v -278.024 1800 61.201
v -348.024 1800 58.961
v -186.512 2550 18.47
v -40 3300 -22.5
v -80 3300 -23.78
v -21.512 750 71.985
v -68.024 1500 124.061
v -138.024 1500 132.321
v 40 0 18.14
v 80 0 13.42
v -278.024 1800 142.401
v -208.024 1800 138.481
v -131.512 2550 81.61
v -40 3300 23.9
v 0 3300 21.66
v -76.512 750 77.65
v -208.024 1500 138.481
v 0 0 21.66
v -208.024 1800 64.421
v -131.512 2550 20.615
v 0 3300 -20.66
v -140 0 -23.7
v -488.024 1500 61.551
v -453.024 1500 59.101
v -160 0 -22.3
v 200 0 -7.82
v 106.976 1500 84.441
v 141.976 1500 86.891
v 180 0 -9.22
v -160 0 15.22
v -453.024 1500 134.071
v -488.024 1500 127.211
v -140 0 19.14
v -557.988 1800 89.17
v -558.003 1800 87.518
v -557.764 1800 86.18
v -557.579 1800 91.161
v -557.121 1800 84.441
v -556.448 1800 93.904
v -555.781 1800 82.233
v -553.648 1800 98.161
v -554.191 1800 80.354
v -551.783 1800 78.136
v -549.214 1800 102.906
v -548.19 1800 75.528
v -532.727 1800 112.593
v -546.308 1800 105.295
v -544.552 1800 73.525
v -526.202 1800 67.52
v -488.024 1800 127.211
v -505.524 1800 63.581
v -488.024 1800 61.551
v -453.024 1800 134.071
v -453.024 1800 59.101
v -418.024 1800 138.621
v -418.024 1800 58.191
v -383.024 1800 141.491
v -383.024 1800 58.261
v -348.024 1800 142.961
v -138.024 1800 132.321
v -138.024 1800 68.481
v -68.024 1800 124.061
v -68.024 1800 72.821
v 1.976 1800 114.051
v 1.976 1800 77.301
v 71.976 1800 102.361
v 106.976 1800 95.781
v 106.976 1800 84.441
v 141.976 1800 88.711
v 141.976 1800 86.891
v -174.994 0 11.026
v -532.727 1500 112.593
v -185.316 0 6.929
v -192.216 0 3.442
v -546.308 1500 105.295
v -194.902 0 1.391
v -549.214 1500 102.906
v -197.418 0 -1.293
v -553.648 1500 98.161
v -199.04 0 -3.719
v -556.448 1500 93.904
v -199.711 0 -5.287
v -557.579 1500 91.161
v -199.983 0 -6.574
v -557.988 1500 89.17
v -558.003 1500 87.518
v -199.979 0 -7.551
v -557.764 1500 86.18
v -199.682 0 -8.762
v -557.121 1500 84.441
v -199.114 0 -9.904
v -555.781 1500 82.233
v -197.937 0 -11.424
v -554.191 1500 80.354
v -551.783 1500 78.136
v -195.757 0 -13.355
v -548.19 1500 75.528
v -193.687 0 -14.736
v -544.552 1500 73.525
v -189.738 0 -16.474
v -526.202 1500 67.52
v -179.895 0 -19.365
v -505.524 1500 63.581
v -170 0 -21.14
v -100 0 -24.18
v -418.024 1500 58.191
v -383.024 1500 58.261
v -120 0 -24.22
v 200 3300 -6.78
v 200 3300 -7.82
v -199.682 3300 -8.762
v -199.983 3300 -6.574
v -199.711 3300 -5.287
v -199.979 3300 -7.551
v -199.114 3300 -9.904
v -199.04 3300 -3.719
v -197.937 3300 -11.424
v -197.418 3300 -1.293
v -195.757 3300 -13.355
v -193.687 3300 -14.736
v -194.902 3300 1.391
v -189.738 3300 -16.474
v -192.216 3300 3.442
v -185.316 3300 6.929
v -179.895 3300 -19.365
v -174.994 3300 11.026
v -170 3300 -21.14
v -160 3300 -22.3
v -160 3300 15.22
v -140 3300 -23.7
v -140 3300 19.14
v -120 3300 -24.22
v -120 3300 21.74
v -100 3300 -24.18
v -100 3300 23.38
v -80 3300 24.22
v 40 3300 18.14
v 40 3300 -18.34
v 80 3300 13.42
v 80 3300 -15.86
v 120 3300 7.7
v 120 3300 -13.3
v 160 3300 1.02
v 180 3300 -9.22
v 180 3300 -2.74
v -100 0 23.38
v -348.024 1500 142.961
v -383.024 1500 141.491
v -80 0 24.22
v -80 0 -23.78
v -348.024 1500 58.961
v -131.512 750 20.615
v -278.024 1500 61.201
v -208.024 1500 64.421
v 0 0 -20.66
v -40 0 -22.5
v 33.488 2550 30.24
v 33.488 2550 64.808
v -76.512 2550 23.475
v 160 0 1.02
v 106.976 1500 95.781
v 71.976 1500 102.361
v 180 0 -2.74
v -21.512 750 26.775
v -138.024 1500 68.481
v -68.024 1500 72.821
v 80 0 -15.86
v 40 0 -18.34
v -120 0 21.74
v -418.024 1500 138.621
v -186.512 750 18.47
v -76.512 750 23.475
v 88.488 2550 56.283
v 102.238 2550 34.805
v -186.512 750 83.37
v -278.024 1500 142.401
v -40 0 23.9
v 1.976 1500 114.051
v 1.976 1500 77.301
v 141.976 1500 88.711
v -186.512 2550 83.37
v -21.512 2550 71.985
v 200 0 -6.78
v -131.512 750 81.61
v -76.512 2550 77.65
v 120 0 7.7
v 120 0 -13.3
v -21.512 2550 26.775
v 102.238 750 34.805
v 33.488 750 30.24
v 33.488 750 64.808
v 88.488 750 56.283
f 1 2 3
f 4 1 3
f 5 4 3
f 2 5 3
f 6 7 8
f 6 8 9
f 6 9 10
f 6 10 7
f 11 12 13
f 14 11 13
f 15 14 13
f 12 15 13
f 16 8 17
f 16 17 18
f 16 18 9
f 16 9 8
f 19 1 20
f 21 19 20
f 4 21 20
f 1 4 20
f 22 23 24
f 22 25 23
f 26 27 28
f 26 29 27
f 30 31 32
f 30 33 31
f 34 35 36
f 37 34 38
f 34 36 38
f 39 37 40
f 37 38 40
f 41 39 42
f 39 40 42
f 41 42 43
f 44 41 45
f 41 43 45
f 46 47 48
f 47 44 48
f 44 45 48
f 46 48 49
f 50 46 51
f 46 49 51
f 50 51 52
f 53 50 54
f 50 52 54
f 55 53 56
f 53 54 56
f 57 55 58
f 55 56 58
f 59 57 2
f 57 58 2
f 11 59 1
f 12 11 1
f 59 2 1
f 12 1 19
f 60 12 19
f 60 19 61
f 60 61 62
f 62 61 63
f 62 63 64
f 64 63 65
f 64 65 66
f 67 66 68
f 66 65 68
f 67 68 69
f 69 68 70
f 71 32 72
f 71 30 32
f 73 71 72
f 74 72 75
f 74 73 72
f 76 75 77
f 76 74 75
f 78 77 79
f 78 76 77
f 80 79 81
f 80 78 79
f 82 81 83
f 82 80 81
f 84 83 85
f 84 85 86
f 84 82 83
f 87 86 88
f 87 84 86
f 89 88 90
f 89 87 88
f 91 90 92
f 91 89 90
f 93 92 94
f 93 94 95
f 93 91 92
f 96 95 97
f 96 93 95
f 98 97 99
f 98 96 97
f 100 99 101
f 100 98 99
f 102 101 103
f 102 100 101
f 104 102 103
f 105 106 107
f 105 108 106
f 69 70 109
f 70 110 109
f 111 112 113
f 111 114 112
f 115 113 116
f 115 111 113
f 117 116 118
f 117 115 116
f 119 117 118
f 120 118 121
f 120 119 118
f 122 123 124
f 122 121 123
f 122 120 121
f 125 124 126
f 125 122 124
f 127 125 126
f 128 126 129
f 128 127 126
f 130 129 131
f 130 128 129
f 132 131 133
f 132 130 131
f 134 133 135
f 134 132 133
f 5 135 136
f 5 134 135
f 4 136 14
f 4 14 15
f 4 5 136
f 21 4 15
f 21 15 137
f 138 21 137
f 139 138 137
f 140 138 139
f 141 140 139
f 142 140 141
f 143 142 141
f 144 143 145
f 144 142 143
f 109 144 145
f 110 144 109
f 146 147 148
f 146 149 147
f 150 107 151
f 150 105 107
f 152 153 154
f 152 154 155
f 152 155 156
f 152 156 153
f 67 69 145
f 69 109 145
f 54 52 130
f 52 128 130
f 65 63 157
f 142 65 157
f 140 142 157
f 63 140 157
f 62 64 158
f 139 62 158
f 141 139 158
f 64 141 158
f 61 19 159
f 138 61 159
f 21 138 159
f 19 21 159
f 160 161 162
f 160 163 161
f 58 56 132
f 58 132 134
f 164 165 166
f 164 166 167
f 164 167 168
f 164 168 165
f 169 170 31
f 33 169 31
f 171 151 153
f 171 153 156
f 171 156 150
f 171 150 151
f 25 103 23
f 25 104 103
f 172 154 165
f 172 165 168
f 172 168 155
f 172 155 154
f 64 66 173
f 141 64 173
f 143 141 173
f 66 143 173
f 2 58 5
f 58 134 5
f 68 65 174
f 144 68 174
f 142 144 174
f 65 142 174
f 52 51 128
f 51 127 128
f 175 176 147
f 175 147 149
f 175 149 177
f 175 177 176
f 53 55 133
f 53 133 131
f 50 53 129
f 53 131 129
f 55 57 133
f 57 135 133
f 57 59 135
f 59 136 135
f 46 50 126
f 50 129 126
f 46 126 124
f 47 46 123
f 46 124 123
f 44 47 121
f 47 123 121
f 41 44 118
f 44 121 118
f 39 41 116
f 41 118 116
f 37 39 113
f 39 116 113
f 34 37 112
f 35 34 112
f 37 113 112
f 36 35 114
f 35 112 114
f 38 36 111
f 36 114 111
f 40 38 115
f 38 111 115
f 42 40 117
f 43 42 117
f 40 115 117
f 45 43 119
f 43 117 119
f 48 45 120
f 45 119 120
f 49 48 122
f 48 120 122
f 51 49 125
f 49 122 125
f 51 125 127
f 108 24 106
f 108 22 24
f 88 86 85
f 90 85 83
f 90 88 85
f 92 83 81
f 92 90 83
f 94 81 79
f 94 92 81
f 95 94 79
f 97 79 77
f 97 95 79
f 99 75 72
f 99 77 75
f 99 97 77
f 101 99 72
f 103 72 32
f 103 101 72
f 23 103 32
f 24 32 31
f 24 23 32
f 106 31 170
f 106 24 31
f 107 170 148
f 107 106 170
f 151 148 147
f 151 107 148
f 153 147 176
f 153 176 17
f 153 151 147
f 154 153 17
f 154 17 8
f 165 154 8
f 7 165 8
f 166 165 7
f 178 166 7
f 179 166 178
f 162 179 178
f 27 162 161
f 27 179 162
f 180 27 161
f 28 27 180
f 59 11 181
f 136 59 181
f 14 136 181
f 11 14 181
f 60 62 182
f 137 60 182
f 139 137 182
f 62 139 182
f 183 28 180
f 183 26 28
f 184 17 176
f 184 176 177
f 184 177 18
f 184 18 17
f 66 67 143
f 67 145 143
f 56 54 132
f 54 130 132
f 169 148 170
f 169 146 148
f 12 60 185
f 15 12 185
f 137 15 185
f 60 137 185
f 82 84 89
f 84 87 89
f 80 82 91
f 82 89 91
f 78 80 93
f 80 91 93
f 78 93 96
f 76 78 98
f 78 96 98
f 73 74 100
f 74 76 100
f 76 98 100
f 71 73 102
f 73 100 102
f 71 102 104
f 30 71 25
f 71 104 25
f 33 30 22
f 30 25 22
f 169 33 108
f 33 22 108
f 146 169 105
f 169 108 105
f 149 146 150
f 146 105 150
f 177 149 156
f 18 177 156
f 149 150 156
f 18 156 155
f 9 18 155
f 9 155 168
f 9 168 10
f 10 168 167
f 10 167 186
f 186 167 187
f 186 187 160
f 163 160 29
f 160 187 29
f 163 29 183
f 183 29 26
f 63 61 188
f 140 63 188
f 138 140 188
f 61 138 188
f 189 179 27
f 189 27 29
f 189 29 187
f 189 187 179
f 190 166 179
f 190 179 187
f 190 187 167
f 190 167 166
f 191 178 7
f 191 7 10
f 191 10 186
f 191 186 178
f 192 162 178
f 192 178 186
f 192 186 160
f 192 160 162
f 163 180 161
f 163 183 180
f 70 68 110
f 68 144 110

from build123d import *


with BuildPart() as f3:
    # F2 (on offset) → F3 section 0
    with BuildSketch(Plane.XZ.offset(-1500)):
        with BuildLine():
            Line((-453.024005903, 134.070815636), (-488.024005903, 127.210815636))
            add(Edge.make_bspline(
                [(-488.024005903, 127.210815636), (-505.524005903, 122.520815636), (-500.2827367227, 124.0903816748), (-524.2115035713, 116.9246020698), (-540.5564075877, 108.8332722079), (-549.2720273912, 103.9636179679), (-562.9742481019, 87.5249499302), (-549.0618991003, 75.3944652873), (-540.7368431214, 71.7342588003), (-522.7393658392, 66.1975777348), (-511.0469874932, 64.3602690089), (-505.524005903, 63.580815636)],
                knots=[0, 0, 0, 0, 0.0927402139, 0.1863001415, 0.2818539948, 0.3525968802, 0.4435048891, 0.5264431503, 0.5945362542, 0.6876161998, 0.7794915956, 0.7794915956, 0.7794915956, 0.7794915956], degree=3))
            Line((-505.524005903, 63.580815636), (-488.024005903, 61.550815636))
            add(Edge.make_bspline(
                [(-488.024005903, 61.550815636), (-478.4452616439, 60.6895704297), (-465.7346175052, 59.8951974592), (-453.024005903, 59.100815636)],
                knots=[0.8709425935, 0.8709425935, 0.8709425935, 0.8709425935, 1, 1, 1, 1], degree=3))
            Line((-453.024005903, 59.100815636), (-418.024005903, 58.190815636))
            Line((-418.024005903, 58.190815636), (-383.024005903, 58.260815636))
            Line((-383.024005903, 58.260815636), (-348.024005903, 58.960815636))
            Line((-348.024005903, 58.960815636), (-278.024005903, 61.200815636))
            Line((-278.024005903, 61.200815636), (-208.024005903, 64.420815636))
            Line((-208.024005903, 64.420815636), (-138.024005903, 68.480815636))
            Line((-138.024005903, 68.480815636), (-68.024005903, 72.820815636))
            Line((-68.024005903, 72.820815636), (1.975994097, 77.300815636))
            Line((1.975994097, 77.300815636), (71.975994097, 82.060815636))
            Line((71.975994097, 82.060815636), (106.975994097, 84.440815636))
            Line((106.975994097, 84.440815636), (141.975994097, 86.890815636))
            Line((141.975994097, 86.890815636), (141.975994097, 88.710815636))
            Line((141.975994097, 88.710815636), (106.975994097, 95.780815636))
            Line((106.975994097, 95.780815636), (71.975994097, 102.360815636))
            Line((71.975994097, 102.360815636), (1.975994097, 114.050815636))
            Line((1.975994097, 114.050815636), (-68.024005903, 124.060815636))
            Line((-68.024005903, 124.060815636), (-138.024005903, 132.320815636))
            Line((-138.024005903, 132.320815636), (-208.024005903, 138.480815636))
            Line((-208.024005903, 138.480815636), (-278.024005903, 142.400815636))
            Line((-278.024005903, 142.400815636), (-348.024005903, 142.960815636))
            Line((-348.024005903, 142.960815636), (-383.024005903, 141.490815636))
            Line((-383.024005903, 141.490815636), (-418.024005903, 138.620815636))
            Line((-418.024005903, 138.620815636), (-453.024005903, 134.070815636))
        make_face()
    # F1 (on Front) → F3 section 1
    with BuildSketch(Plane.XZ):
        with BuildLine():
            Line((-140, 19.14), (-160, 15.22))
            add(Edge.make_bspline(
                [(-160, 15.22), (-163.3614930577, 14.3462198296), (-170.1141907895, 12.5909363071), (-179.8146019131, 9.5772340737), (-190.1840383373, 4.6735107199), (-194.947511806, 1.9498605419), (-202.8425195497, -7.4613949262), (-194.8759768107, -14.3885759744), (-190.1226032141, -16.4811567906), (-179.8370560736, -19.6446277986), (-173.1559442507, -20.6945857665), (-170, -21.14)],
                knots=[0, 0, 0, 0, 0.0927402139, 0.1863001415, 0.2818539948, 0.3525968802, 0.4435048891, 0.5264431503, 0.5945362542, 0.6876161998, 0.7794915956, 0.7794915956, 0.7794915956, 0.7794915956], degree=3))
            Line((-170, -21.14), (-160, -22.3))
            add(Edge.make_bspline(
                [(-160, -22.3), (-154.5264132597, -22.7921350592), (-147.2632066298, -23.2460675296), (-140, -23.7)],
                knots=[0.8709425935, 0.8709425935, 0.8709425935, 0.8709425935, 1, 1, 1, 1], degree=3))
            Line((-140, -23.7), (-120, -24.22))
            Line((-120, -24.22), (-100, -24.18))
            Line((-100, -24.18), (-80, -23.78))
            Line((-80, -23.78), (-40, -22.5))
            Line((-40, -22.5), (0, -20.66))
            Line((0, -20.66), (40, -18.34))
            Line((40, -18.34), (80, -15.86))
            Line((80, -15.86), (120, -13.3))
            Line((120, -13.3), (160, -10.58))
            Line((160, -10.58), (180, -9.22))
            Line((180, -9.22), (200, -7.82))
            Line((200, -7.82), (200, -6.78))
            Line((200, -6.78), (180, -2.74))
            Line((180, -2.74), (160, 1.02))
            Line((160, 1.02), (120, 7.7))
            Line((120, 7.7), (80, 13.42))
            Line((80, 13.42), (40, 18.14))
            Line((40, 18.14), (0, 21.66))
            Line((0, 21.66), (-40, 23.9))
            Line((-40, 23.9), (-80, 24.22))
            Line((-80, 24.22), (-100, 23.38))
            Line((-100, 23.38), (-120, 21.74))
            Line((-120, 21.74), (-140, 19.14))
        make_face()
    loft()


with BuildPart() as f5_1:
    # F5: instance of F3
    add(f3.part.mirror(Plane.XZ.offset(-1650)))


solid = Compound([f3.part, f5_1.part])
